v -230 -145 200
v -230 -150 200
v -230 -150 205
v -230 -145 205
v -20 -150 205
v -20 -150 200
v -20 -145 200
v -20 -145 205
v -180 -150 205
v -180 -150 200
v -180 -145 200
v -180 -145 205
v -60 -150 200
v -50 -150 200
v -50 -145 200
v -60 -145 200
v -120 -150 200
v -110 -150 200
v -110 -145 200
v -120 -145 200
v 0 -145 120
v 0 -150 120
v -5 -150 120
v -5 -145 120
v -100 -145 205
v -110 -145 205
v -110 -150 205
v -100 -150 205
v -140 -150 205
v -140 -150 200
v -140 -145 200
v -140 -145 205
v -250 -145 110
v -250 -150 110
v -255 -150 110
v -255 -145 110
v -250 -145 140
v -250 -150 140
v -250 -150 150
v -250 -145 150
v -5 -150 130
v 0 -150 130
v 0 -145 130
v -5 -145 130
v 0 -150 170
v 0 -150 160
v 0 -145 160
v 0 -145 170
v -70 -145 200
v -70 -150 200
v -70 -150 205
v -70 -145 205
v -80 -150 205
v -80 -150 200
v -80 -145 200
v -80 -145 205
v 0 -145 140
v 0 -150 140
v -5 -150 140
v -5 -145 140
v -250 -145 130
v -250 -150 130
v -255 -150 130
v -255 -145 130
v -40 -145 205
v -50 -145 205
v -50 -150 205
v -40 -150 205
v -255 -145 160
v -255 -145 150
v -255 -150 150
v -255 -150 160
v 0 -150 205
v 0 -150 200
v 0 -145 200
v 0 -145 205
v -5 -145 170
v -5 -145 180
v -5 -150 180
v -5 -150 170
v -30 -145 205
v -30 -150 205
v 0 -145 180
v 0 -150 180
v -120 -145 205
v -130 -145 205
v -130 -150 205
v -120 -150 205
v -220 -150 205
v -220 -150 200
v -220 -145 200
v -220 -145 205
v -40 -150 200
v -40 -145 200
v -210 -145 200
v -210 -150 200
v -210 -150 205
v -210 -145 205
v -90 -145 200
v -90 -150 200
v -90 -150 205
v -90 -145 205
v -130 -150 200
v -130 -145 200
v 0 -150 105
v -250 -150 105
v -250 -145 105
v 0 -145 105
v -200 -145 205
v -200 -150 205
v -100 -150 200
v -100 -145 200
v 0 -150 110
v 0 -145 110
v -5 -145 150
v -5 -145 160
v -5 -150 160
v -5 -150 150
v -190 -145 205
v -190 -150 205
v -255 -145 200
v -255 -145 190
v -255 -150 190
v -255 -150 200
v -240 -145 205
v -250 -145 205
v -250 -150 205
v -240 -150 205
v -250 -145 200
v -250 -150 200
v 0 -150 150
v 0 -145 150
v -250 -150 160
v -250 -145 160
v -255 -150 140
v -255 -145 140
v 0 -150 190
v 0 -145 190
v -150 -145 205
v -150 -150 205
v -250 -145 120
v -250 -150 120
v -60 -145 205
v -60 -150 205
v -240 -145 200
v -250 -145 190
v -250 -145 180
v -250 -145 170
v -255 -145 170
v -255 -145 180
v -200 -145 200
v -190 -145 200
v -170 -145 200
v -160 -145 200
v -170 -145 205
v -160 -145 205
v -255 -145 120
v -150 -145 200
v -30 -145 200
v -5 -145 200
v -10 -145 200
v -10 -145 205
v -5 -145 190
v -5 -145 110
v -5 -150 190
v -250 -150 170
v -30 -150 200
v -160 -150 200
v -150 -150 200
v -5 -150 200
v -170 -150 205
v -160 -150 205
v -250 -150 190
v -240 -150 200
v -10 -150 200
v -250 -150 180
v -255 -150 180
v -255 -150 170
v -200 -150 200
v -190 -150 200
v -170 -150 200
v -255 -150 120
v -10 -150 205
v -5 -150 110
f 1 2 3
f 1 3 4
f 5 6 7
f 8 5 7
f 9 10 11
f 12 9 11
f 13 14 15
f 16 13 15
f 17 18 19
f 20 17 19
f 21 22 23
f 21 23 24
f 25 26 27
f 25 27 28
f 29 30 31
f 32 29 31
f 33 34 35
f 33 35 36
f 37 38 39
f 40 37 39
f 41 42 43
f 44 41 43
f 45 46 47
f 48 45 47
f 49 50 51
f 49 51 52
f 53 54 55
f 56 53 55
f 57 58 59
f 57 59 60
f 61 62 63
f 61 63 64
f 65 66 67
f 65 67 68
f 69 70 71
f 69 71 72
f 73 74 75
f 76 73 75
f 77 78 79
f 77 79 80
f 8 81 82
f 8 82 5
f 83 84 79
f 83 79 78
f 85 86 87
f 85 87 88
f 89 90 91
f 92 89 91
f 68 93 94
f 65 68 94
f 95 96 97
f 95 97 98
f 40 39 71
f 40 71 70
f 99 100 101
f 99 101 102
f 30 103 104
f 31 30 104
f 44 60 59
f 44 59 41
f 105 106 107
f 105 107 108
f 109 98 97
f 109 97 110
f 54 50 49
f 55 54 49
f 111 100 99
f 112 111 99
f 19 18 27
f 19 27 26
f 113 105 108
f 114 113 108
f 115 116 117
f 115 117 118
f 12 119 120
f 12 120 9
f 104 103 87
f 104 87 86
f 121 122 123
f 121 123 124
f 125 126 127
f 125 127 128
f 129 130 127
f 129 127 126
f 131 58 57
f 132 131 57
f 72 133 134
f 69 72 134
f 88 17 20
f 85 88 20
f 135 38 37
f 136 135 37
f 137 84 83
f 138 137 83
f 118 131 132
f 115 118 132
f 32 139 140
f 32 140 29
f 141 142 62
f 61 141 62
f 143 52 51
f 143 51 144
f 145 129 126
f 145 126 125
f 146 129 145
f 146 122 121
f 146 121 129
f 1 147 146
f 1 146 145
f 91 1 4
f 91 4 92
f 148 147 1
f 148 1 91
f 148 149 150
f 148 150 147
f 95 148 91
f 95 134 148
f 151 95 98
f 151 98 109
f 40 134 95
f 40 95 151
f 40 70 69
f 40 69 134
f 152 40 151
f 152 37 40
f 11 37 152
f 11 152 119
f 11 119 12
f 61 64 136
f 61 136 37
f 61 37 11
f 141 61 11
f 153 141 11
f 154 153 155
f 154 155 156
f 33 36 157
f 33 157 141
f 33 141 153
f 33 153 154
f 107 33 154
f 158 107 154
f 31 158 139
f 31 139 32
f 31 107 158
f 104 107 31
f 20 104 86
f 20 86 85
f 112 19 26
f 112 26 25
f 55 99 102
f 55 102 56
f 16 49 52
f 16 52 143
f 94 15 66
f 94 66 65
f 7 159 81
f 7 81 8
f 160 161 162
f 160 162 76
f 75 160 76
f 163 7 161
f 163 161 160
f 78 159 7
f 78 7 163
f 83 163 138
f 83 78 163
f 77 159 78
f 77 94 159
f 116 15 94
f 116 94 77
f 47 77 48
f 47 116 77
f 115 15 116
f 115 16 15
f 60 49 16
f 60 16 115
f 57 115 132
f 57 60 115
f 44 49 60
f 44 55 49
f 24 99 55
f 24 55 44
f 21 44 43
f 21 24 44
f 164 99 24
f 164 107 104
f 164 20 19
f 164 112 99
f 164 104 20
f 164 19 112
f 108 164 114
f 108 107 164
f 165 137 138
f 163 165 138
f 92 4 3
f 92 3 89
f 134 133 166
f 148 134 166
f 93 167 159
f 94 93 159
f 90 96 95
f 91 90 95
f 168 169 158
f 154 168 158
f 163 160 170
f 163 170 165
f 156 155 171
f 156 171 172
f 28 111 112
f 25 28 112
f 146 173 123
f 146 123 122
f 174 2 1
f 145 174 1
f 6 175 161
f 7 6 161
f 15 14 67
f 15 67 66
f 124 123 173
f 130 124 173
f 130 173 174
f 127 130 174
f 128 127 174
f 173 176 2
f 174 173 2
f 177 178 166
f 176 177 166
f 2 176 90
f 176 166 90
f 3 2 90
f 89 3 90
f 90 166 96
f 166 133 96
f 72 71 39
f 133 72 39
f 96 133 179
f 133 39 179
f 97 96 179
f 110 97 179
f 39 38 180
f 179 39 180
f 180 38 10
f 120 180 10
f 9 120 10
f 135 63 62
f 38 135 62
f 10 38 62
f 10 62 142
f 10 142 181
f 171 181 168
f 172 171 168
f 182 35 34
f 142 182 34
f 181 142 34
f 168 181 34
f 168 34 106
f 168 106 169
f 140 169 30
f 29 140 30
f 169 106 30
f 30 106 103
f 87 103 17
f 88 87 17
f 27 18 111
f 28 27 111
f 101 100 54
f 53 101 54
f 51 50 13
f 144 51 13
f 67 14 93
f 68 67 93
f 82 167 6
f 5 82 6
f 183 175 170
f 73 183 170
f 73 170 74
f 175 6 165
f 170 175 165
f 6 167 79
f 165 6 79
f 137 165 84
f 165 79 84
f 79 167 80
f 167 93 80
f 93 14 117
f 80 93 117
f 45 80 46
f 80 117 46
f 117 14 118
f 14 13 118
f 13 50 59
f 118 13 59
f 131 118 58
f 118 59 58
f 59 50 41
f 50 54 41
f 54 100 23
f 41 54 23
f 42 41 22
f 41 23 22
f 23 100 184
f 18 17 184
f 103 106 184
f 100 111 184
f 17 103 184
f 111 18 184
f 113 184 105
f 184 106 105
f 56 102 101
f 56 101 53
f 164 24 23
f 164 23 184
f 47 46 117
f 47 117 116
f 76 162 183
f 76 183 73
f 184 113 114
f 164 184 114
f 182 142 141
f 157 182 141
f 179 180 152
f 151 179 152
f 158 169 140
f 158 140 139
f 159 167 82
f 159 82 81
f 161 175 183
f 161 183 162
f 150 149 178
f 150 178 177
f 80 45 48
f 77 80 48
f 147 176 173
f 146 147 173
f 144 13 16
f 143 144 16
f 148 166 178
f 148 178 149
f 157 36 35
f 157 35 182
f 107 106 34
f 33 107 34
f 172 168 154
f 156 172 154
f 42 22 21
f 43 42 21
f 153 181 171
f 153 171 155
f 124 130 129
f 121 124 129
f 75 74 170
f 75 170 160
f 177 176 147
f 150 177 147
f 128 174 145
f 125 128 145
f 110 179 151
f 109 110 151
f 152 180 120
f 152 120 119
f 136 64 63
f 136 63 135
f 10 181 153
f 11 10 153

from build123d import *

# Parameters (mm, degrees)
SKETCH013_W             = 95
SKETCH013_H             = 250
PAD011_DEPTH            = 5
SKETCH036_W             = 10
SKETCH036_H             = 5
PAD028_DEPTH            = 5
LINEARPATTERN016_COUNT  = 5
LINEARPATTERN016_PITCH  = 20
SKETCH040_W             = 10
SKETCH040_H             = 5
PAD029_DEPTH            = 5
LINEARPATTERN020_COUNT  = 13
LINEARPATTERN020_PITCH  = 20
SKETCH049_W             = 10
SKETCH049_H             = 5
POCKET015_DEPTH         = 5
LINEARPATTERN029_COUNT  = 5
LINEARPATTERN029_PITCH  = 20
BODY011_PITCH_ANGLE     = -90
BODY011_PLACEMENT_ANGLE = -90


with BuildPart() as part:
    # Sketch013 → Pad011 (new body)
    with BuildSketch(Plane.XY):
        Rectangle(SKETCH013_W, SKETCH013_H)
    extrude(amount=PAD011_DEPTH)

    # Sketch036 (on DatumPlane) → Pad028 (join)
    with BuildSketch(Plane.XZ.offset(125)):
        with Locations((-37.5, 2.5)):
            Rectangle(SKETCH036_W, SKETCH036_H)
    pad028 = extrude(amount=PAD028_DEPTH)

    # LinearPattern016: Pad028 ×5
    with Locations(*[(i * LINEARPATTERN016_PITCH, 0, 0) for i in range(1, LINEARPATTERN016_COUNT)]):
        add(pad028)

    # Sketch040 (on DatumPlane) → Pad029 (join)
    with BuildSketch(Plane.YZ.offset(47.5)):
        with Locations((-120, 2.5)):
            Rectangle(SKETCH040_W, SKETCH040_H)
    pad029 = extrude(amount=PAD029_DEPTH)

    # LinearPattern020: Pad029 ×13
    with Locations(*[(0, i * LINEARPATTERN020_PITCH, 0) for i in range(1, LINEARPATTERN020_COUNT)]):
        add(pad029)

    # Sketch049 (on DatumPlane) → Pocket015 (cut)
    with BuildSketch(Plane(origin=(0, 125, 0), x_dir=(-1, 0, 0), z_dir=(0, 1, 0))):
        with Locations((-42.5, 2.5)):
            Rectangle(SKETCH049_W, SKETCH049_H)
    pocket015 = extrude(amount=-POCKET015_DEPTH, mode=Mode.SUBTRACT)

    # LinearPattern029: Pocket015 ×5
    with Locations(*[(-i * LINEARPATTERN029_PITCH, 0, 0) for i in range(1, LINEARPATTERN029_COUNT)]):
        add(pocket015, mode=Mode.SUBTRACT)


with BuildPart() as part_1:
    # Body011 pitch: moved
    add(part.part.rotate(Axis((0, 0, 0), (0, 1, 0)), BODY011_PITCH_ANGLE))


with BuildPart() as part_2:
    # Body011 placement: moved
    add(part_1.part.moved(Location((-125, -150, 152.5))).rotate(Axis((-125, -150, 152.5), (0, 0, 1)), BODY011_PLACEMENT_ANGLE))


solid = part_2.part
